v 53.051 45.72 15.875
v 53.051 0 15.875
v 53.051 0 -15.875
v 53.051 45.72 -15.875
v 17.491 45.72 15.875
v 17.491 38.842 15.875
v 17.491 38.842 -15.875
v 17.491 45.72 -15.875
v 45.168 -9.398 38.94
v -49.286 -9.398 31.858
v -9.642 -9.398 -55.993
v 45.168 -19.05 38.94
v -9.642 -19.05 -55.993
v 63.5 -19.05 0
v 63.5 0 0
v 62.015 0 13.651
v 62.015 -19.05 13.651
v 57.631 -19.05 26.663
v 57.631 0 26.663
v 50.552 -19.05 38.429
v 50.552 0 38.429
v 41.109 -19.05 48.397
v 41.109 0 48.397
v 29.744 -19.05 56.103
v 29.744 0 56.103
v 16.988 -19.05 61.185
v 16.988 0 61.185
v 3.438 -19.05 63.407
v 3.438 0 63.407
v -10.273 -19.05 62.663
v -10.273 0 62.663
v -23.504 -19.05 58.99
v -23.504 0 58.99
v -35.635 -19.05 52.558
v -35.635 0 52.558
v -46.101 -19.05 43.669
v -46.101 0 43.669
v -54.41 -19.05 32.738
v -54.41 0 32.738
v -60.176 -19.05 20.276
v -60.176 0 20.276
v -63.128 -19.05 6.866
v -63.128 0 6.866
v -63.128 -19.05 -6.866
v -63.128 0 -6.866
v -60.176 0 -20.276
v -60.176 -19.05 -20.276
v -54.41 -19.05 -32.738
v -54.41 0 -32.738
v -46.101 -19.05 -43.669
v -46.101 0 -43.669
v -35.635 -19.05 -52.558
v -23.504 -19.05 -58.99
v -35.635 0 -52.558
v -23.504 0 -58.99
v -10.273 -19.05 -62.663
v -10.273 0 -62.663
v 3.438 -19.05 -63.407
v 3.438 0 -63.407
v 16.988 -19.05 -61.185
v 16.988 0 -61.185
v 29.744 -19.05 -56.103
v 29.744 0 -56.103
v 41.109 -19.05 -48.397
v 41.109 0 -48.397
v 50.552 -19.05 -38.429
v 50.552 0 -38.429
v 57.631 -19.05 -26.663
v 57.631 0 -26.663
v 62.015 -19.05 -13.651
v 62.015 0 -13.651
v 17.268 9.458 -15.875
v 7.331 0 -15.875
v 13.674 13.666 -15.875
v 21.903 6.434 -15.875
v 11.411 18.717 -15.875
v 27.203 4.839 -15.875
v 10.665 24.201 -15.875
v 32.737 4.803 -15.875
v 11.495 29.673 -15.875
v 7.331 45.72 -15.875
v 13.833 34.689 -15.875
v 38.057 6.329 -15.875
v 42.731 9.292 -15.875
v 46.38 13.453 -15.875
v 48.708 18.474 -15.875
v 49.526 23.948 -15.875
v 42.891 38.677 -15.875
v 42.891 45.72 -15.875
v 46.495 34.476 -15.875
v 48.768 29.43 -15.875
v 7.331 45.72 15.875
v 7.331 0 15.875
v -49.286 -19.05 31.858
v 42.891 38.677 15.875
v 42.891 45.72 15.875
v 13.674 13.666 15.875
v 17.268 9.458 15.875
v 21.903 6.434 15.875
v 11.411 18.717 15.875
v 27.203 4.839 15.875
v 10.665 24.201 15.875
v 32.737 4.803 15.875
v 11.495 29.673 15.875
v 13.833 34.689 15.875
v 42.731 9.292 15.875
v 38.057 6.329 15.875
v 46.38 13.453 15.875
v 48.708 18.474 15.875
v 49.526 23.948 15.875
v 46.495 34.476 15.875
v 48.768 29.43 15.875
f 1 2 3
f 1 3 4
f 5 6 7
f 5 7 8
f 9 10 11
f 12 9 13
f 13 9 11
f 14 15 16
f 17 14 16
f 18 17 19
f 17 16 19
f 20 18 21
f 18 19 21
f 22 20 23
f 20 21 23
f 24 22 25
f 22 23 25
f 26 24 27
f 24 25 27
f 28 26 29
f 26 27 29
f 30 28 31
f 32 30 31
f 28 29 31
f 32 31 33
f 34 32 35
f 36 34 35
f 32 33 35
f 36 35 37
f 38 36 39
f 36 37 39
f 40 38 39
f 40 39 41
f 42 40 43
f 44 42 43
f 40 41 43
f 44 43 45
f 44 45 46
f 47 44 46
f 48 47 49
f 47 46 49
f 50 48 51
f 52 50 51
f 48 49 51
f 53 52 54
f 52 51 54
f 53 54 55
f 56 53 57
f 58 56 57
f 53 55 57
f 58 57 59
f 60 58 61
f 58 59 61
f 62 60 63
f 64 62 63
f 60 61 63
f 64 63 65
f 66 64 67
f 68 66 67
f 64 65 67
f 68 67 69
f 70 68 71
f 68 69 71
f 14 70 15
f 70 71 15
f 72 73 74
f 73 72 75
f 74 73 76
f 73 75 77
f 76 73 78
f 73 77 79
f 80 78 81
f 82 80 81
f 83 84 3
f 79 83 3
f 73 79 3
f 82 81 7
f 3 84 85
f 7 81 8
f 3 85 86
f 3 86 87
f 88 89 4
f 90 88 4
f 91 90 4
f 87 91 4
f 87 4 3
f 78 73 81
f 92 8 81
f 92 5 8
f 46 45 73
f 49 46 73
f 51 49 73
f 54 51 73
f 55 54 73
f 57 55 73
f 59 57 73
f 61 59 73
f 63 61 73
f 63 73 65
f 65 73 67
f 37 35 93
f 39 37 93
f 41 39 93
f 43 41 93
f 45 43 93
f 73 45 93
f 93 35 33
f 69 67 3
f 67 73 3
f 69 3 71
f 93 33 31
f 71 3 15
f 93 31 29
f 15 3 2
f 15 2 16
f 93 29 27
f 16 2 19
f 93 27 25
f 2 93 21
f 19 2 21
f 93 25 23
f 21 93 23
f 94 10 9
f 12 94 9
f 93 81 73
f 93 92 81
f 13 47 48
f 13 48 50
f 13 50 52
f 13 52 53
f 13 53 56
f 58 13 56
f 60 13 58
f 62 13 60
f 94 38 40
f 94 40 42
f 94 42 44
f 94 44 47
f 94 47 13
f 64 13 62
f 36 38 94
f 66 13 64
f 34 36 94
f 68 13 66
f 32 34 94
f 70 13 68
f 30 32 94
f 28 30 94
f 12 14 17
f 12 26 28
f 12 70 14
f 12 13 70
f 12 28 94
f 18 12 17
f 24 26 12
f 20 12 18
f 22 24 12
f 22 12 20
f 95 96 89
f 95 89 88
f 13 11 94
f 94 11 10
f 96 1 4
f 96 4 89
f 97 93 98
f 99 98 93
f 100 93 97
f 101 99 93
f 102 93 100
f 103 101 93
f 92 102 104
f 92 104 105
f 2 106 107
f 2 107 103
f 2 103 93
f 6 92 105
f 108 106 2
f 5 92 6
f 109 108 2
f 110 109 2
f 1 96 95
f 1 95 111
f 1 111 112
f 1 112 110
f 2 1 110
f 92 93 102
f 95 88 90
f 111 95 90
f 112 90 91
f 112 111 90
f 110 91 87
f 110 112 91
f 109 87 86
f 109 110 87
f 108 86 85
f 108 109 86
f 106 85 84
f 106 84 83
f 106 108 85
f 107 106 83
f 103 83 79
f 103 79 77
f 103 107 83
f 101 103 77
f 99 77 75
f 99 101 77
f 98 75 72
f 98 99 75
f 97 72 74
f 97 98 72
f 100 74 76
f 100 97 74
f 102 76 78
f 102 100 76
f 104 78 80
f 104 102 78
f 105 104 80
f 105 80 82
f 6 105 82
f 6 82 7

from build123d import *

# Parameters (mm, degrees)
F0_R     = 63.5
F1_DEPTH = 19.05
F2_DEPTH = 9.398
F4_DEPTH = 15.875


with BuildPart() as f1:
    # F0 (on Front) → F1 (new body)
    with BuildSketch(Plane.XZ):
        Circle(F0_R)
        Polygon((-49.285696, 31.858407), (45.167994, 38.940311), (-9.641714, -55.992887), align=None, mode=Mode.SUBTRACT)
    extrude(amount=F1_DEPTH)

    # F0 (on Front) → F2 (join)
    with BuildSketch(Plane.XZ):
        Polygon((-9.641714, -55.992887), (45.167994, 38.940311), (-49.285696, 31.858407), align=None)
    extrude(amount=F2_DEPTH)

    # F3 (on Top) → F4 (join, symmetric)
    with BuildSketch(Plane.XY):
        with BuildLine():
            Line((7.331135, 0), (53.051135, 0))
            Line((53.051135, 0), (53.051135, 45.72))
            Line((53.051135, 45.72), (42.891135, 45.72))
            Line((42.891135, 45.72), (42.891135, 38.676579))
            ThreePointArc((42.891135, 38.676579), (29.968754, 4.623022), (17.491135, 38.842048))
            Line((17.491135, 38.842048), (17.491135, 45.72))
            Line((17.491135, 45.72), (7.331135, 45.72))
            Line((7.331135, 45.72), (7.331135, 0))
        make_face()
    extrude(amount=F4_DEPTH, both=True)


solid = f1.part
